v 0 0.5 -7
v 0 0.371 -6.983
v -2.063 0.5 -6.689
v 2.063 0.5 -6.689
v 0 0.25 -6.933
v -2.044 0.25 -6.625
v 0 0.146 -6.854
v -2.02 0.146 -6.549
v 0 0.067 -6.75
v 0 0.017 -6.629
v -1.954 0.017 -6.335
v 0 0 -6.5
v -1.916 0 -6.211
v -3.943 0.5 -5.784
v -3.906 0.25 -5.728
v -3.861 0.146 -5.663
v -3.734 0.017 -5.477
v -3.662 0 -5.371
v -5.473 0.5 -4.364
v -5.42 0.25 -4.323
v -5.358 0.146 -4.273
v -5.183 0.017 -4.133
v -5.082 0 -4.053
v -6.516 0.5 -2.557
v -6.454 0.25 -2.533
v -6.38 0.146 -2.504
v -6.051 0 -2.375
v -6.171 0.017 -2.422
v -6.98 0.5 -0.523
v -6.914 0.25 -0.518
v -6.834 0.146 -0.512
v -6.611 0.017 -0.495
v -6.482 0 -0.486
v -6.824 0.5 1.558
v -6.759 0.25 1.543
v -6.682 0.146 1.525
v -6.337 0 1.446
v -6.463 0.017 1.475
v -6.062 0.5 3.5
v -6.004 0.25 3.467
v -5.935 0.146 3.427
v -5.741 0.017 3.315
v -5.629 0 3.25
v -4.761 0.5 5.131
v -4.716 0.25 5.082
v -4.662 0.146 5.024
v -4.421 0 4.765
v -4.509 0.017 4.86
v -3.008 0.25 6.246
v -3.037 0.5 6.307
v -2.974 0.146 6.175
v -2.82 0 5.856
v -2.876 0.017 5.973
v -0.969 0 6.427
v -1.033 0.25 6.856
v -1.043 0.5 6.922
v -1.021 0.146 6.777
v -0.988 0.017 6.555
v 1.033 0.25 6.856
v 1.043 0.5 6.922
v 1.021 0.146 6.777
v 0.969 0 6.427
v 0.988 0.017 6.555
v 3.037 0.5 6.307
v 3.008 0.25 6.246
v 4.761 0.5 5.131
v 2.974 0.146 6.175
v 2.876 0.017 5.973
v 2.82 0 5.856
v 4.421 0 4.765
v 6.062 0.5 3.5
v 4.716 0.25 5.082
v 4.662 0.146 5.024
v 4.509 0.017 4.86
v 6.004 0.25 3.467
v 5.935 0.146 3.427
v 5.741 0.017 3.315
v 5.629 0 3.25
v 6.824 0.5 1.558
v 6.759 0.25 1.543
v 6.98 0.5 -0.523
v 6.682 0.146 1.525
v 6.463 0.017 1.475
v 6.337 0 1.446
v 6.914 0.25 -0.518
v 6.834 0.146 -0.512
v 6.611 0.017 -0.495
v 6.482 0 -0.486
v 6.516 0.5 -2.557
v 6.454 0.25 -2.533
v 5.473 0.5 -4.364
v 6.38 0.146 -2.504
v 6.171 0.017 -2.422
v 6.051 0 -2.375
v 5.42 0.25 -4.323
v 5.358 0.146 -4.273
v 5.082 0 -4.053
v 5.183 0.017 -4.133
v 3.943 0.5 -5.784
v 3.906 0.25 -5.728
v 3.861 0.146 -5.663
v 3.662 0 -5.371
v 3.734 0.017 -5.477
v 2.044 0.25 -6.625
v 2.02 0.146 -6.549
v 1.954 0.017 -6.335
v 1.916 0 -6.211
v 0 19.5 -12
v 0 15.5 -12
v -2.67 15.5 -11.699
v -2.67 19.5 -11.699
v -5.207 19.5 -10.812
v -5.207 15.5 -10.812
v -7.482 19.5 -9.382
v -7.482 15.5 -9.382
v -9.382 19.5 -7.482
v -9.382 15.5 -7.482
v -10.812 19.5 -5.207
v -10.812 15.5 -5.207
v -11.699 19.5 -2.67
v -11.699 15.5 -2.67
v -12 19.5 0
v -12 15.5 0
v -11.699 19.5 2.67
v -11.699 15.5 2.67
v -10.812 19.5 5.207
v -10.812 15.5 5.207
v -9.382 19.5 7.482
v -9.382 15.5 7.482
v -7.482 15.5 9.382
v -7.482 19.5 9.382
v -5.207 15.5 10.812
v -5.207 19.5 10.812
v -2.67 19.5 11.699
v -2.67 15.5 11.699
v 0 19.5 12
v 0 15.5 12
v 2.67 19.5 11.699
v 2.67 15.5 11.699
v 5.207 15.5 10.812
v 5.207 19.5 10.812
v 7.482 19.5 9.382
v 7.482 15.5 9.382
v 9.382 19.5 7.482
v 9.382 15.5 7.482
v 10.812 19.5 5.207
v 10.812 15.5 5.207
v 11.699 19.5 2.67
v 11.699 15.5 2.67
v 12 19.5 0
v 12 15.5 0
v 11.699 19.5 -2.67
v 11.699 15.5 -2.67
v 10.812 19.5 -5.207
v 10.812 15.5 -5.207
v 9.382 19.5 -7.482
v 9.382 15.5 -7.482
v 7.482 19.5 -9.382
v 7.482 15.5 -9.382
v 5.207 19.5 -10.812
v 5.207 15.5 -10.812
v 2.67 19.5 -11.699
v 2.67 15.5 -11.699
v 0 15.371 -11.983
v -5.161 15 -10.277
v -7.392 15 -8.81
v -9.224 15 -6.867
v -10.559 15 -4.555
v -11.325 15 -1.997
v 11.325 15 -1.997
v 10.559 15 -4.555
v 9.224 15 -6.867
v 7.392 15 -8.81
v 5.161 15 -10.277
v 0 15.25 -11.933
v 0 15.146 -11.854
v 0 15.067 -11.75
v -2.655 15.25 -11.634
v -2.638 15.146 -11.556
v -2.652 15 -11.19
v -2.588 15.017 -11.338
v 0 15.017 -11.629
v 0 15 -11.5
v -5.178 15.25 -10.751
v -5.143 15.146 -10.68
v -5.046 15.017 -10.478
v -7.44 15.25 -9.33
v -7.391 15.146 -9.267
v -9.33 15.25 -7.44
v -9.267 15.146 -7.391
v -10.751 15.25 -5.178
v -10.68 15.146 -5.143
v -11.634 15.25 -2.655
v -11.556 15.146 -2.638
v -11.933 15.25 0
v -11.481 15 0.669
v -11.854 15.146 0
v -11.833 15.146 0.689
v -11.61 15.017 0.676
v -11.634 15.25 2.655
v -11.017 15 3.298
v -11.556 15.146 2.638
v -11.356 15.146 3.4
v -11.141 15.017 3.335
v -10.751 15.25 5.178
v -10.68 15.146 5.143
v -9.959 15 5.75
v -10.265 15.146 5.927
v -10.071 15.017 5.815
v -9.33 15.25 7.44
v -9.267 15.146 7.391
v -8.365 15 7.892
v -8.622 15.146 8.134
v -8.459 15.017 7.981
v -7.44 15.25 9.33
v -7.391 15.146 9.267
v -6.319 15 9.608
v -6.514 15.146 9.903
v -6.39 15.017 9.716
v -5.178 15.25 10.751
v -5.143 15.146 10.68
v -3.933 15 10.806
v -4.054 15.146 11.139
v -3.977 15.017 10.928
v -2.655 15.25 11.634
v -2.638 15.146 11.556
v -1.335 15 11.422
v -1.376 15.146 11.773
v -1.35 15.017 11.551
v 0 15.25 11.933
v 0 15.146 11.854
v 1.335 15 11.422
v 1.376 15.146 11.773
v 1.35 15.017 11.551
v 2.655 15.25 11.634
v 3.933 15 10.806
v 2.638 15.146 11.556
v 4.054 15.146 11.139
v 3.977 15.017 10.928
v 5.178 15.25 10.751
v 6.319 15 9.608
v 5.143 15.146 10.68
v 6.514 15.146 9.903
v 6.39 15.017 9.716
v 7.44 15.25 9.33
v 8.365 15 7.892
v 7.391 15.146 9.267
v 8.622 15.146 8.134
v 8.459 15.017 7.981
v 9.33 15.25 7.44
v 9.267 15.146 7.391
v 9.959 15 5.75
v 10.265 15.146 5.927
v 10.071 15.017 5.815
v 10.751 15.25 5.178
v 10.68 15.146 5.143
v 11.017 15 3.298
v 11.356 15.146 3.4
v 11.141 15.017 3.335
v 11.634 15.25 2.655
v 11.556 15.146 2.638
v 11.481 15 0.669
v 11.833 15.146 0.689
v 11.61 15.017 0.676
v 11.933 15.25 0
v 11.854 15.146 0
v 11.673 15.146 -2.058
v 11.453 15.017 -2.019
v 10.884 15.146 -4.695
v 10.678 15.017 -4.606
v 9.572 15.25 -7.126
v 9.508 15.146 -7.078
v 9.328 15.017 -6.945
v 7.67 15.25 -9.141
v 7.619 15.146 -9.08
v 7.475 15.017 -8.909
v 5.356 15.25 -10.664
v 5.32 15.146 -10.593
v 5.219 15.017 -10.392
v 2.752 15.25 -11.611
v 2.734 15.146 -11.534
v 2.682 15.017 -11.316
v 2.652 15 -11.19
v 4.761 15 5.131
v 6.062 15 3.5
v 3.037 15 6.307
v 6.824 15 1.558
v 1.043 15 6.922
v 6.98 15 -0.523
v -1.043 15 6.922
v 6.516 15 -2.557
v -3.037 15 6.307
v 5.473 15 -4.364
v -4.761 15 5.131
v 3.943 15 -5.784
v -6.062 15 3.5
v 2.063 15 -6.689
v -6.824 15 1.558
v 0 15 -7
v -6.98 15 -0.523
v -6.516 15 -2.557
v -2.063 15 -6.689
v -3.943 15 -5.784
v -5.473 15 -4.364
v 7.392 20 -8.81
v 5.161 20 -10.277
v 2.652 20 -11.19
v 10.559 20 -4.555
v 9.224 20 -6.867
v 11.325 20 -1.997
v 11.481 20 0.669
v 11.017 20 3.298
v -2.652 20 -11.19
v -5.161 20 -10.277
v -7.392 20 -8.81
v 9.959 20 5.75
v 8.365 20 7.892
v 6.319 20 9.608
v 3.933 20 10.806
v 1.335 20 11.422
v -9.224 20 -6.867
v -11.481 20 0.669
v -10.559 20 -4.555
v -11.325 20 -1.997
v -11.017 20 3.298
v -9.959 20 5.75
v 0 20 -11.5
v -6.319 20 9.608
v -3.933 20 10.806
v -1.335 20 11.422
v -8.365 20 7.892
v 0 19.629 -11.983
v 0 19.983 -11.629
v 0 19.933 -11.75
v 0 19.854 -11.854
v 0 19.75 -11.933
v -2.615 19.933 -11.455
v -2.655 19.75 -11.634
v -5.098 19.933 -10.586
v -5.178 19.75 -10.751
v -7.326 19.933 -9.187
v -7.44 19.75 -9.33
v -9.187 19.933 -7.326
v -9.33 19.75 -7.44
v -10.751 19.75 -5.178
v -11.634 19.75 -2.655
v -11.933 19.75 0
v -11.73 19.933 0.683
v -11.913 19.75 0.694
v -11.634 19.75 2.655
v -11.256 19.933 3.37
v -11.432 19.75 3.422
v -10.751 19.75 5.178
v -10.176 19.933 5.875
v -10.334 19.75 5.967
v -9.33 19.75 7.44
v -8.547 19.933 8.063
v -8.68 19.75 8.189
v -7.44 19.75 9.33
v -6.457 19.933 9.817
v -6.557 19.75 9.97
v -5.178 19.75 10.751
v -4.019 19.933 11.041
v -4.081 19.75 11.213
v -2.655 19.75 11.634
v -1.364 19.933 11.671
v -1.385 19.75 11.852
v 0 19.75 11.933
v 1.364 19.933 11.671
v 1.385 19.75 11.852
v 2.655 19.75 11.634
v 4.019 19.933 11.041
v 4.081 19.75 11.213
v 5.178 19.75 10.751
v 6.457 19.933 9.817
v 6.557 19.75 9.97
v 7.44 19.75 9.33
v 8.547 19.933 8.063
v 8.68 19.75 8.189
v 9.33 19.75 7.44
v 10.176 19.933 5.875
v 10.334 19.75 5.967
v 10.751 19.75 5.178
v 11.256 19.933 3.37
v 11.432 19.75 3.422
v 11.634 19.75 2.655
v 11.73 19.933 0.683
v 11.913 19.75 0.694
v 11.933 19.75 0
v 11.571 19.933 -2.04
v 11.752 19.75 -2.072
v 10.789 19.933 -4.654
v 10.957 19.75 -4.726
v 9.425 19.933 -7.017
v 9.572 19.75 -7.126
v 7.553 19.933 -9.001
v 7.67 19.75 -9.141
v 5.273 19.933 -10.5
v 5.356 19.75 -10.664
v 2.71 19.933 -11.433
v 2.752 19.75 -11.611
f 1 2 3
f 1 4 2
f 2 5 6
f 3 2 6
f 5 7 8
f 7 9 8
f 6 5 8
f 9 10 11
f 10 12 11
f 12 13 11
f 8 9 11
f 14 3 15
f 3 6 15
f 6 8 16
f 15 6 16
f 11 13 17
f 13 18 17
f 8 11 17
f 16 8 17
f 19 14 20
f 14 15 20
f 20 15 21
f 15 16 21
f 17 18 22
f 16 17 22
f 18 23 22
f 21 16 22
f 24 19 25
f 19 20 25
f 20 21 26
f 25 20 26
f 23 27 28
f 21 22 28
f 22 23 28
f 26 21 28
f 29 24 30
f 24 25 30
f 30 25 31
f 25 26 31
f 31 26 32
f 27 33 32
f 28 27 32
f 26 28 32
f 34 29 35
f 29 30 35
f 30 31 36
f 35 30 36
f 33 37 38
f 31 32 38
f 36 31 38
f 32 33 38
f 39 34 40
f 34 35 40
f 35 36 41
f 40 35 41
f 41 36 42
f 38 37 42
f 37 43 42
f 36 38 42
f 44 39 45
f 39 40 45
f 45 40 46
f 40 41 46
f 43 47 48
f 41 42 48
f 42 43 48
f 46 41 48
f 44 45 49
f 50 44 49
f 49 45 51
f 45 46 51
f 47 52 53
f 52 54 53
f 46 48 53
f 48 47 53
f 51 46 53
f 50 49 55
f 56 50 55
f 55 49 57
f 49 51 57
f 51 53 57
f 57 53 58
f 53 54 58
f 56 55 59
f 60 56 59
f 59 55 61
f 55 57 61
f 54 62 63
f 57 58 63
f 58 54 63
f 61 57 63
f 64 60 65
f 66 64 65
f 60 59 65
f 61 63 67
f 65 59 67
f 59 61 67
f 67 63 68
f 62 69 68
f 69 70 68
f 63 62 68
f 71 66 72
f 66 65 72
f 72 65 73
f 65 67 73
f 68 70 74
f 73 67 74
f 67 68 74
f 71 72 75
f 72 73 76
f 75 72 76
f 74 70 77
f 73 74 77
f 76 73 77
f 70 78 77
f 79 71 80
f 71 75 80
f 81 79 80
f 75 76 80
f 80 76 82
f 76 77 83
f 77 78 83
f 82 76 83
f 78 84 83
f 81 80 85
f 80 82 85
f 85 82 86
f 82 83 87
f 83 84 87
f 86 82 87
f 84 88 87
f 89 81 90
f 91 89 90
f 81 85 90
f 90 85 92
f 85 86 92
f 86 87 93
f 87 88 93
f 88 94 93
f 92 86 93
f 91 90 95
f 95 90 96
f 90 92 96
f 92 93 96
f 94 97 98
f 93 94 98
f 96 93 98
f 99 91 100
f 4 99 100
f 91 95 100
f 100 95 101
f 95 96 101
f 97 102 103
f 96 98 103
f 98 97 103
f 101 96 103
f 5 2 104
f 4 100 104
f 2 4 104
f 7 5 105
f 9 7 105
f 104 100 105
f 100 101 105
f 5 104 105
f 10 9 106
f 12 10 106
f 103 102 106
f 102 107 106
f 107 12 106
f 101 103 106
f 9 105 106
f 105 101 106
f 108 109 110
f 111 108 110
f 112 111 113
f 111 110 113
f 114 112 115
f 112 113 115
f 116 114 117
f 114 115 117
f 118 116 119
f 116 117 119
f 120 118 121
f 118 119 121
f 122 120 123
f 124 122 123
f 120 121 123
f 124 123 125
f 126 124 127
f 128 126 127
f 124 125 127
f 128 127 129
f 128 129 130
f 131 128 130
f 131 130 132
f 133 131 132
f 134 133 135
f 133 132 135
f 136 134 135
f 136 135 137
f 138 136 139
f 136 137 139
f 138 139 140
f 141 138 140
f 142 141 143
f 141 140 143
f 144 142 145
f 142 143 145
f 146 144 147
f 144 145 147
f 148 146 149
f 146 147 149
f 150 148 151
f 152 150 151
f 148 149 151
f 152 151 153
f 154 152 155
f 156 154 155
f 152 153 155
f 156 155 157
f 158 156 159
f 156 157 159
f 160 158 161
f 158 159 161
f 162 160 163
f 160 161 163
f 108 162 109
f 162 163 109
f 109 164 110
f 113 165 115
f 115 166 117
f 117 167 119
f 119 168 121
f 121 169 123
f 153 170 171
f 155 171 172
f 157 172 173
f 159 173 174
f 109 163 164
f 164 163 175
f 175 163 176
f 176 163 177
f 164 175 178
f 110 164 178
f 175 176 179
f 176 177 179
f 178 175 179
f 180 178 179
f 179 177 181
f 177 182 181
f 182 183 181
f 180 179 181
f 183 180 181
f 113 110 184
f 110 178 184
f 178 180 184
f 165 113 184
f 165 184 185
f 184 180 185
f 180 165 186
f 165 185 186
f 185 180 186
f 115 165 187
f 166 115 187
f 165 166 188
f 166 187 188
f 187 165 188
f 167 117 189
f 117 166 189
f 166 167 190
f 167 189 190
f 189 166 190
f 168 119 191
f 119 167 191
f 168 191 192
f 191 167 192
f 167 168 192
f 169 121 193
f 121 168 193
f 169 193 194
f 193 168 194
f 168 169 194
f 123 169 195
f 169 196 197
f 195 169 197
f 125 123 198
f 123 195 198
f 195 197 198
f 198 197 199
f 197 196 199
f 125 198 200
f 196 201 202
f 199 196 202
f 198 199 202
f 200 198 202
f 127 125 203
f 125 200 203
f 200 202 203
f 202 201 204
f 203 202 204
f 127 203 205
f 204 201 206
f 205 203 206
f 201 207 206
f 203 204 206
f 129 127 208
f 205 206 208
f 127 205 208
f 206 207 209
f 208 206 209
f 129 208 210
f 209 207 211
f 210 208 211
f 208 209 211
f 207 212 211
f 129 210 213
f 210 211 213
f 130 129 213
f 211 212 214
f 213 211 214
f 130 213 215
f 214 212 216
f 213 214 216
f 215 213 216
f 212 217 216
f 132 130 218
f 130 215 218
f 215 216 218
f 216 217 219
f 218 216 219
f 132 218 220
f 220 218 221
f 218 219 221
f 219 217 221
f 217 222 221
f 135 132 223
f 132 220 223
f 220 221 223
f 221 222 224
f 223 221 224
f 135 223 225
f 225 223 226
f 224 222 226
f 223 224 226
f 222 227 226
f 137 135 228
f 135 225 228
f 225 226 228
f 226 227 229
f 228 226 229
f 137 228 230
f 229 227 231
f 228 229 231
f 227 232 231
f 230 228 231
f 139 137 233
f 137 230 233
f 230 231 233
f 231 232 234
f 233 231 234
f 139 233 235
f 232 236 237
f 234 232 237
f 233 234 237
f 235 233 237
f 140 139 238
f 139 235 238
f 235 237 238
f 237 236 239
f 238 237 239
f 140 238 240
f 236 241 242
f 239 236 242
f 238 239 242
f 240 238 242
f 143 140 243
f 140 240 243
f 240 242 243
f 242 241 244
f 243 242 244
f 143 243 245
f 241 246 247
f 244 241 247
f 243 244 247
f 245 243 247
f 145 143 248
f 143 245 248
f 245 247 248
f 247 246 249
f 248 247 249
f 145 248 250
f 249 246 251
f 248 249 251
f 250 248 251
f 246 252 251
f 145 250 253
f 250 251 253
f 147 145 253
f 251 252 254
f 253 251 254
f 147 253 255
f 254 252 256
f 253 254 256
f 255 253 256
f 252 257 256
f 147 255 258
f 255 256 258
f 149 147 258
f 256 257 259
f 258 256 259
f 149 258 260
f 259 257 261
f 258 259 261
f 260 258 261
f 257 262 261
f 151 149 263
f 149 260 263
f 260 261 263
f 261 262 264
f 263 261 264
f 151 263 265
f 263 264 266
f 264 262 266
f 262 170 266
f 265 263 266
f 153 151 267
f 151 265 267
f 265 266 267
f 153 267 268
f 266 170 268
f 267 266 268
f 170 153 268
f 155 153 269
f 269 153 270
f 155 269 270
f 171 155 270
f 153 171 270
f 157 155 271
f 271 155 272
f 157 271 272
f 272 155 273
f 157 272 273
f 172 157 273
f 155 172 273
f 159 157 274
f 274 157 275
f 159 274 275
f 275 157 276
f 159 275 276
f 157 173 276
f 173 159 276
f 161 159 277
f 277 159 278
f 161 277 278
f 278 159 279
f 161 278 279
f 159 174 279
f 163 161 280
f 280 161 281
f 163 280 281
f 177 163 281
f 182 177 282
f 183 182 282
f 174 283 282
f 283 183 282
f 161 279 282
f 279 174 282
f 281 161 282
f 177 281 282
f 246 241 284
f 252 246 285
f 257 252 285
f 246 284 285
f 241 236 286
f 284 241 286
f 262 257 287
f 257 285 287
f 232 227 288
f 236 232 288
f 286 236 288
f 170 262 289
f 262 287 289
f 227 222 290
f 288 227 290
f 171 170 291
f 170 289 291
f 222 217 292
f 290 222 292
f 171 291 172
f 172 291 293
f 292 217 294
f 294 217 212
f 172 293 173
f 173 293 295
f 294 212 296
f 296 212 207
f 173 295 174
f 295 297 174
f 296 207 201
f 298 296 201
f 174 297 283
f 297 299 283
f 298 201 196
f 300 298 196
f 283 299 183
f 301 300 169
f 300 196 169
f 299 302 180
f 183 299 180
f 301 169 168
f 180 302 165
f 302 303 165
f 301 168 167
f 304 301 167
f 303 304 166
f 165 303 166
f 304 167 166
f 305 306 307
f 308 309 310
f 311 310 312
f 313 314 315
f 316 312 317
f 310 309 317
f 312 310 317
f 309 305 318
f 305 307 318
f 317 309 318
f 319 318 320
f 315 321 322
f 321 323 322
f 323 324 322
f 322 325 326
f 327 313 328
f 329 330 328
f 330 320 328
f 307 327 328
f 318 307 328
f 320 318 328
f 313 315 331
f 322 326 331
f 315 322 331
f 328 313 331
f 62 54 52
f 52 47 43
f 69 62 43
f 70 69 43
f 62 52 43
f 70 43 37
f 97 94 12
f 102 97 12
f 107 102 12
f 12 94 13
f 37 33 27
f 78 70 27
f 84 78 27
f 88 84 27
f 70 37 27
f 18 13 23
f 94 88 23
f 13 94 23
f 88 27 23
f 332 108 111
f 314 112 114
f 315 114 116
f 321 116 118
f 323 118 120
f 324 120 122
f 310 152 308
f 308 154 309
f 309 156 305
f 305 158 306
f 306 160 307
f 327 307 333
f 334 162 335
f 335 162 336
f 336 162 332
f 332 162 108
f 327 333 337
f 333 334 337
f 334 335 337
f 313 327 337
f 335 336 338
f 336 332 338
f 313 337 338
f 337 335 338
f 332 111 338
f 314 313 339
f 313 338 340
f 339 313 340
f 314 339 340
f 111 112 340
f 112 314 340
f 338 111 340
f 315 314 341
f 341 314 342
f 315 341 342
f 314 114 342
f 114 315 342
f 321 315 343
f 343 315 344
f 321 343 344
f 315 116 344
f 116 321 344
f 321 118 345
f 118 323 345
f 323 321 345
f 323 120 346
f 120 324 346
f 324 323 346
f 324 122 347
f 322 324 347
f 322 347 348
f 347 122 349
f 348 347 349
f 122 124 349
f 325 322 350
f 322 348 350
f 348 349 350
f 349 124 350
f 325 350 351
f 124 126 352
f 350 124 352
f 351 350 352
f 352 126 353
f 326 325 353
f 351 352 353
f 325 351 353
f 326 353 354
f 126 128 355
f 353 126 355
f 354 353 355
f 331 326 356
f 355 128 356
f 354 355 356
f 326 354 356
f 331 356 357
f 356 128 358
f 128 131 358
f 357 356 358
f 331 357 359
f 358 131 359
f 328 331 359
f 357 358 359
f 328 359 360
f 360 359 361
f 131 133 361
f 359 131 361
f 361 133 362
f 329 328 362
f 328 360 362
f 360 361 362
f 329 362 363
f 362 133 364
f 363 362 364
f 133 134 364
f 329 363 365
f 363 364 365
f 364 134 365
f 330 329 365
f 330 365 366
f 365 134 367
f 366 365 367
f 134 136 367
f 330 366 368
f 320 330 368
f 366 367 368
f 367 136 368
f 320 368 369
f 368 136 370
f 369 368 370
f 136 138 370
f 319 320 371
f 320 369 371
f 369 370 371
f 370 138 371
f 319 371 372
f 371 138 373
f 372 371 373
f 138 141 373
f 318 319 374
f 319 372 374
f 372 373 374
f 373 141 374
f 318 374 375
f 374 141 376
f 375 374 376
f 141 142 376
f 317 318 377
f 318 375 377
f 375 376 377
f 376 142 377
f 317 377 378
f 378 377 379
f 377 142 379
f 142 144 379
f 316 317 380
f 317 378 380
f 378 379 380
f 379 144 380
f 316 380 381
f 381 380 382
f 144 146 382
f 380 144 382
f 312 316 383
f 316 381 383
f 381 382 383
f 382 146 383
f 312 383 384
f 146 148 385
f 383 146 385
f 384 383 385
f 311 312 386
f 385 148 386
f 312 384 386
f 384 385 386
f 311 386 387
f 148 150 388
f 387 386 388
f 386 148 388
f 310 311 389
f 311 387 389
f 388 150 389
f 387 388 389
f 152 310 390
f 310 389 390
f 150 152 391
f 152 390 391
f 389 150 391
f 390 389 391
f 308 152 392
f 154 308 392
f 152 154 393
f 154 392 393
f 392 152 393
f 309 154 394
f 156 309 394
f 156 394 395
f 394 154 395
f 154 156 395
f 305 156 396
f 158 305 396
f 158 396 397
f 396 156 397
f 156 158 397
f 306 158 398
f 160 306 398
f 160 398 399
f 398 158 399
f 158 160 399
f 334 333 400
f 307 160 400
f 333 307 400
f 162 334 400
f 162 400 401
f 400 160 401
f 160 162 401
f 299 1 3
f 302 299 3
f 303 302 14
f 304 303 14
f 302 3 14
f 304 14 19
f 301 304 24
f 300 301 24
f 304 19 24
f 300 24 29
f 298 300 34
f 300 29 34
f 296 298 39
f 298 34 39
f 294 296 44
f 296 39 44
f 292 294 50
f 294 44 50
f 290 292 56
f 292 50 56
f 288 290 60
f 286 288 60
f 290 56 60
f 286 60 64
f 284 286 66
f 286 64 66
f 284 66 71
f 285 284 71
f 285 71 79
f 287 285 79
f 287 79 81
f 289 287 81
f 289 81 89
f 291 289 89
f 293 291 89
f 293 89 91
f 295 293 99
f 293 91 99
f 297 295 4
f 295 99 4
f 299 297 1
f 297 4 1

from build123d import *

# Parameters (mm, degrees)
FILETE1_R = 0.5


with BuildPart() as part:
    # Esboço1 → Revolução1 (revolve)
    with BuildSketch(Plane.XY, mode=Mode.PRIVATE) as revolu_o1_sk:
        Polygon((0, 0), (0, 20), (12, 20), (12, 15), (7, 15), (7, 0), align=None)
    revolve(revolu_o1_sk.sketch.rotate(Axis((0, 0, 0), (0, 1, 0)), 90), axis=Axis((0, 0, 0), (0, 1, 0)))  # turned: the seam where the file's is

    # Filete1
    filete1_edges = [part.edges().sort_by_distance(p)[0] for p in [
        (0, 0, 7),
        (0, 15, 12),
        (0, 20, 12),
    ]]
    fillet(filete1_edges, radius=FILETE1_R)


solid = part.part
